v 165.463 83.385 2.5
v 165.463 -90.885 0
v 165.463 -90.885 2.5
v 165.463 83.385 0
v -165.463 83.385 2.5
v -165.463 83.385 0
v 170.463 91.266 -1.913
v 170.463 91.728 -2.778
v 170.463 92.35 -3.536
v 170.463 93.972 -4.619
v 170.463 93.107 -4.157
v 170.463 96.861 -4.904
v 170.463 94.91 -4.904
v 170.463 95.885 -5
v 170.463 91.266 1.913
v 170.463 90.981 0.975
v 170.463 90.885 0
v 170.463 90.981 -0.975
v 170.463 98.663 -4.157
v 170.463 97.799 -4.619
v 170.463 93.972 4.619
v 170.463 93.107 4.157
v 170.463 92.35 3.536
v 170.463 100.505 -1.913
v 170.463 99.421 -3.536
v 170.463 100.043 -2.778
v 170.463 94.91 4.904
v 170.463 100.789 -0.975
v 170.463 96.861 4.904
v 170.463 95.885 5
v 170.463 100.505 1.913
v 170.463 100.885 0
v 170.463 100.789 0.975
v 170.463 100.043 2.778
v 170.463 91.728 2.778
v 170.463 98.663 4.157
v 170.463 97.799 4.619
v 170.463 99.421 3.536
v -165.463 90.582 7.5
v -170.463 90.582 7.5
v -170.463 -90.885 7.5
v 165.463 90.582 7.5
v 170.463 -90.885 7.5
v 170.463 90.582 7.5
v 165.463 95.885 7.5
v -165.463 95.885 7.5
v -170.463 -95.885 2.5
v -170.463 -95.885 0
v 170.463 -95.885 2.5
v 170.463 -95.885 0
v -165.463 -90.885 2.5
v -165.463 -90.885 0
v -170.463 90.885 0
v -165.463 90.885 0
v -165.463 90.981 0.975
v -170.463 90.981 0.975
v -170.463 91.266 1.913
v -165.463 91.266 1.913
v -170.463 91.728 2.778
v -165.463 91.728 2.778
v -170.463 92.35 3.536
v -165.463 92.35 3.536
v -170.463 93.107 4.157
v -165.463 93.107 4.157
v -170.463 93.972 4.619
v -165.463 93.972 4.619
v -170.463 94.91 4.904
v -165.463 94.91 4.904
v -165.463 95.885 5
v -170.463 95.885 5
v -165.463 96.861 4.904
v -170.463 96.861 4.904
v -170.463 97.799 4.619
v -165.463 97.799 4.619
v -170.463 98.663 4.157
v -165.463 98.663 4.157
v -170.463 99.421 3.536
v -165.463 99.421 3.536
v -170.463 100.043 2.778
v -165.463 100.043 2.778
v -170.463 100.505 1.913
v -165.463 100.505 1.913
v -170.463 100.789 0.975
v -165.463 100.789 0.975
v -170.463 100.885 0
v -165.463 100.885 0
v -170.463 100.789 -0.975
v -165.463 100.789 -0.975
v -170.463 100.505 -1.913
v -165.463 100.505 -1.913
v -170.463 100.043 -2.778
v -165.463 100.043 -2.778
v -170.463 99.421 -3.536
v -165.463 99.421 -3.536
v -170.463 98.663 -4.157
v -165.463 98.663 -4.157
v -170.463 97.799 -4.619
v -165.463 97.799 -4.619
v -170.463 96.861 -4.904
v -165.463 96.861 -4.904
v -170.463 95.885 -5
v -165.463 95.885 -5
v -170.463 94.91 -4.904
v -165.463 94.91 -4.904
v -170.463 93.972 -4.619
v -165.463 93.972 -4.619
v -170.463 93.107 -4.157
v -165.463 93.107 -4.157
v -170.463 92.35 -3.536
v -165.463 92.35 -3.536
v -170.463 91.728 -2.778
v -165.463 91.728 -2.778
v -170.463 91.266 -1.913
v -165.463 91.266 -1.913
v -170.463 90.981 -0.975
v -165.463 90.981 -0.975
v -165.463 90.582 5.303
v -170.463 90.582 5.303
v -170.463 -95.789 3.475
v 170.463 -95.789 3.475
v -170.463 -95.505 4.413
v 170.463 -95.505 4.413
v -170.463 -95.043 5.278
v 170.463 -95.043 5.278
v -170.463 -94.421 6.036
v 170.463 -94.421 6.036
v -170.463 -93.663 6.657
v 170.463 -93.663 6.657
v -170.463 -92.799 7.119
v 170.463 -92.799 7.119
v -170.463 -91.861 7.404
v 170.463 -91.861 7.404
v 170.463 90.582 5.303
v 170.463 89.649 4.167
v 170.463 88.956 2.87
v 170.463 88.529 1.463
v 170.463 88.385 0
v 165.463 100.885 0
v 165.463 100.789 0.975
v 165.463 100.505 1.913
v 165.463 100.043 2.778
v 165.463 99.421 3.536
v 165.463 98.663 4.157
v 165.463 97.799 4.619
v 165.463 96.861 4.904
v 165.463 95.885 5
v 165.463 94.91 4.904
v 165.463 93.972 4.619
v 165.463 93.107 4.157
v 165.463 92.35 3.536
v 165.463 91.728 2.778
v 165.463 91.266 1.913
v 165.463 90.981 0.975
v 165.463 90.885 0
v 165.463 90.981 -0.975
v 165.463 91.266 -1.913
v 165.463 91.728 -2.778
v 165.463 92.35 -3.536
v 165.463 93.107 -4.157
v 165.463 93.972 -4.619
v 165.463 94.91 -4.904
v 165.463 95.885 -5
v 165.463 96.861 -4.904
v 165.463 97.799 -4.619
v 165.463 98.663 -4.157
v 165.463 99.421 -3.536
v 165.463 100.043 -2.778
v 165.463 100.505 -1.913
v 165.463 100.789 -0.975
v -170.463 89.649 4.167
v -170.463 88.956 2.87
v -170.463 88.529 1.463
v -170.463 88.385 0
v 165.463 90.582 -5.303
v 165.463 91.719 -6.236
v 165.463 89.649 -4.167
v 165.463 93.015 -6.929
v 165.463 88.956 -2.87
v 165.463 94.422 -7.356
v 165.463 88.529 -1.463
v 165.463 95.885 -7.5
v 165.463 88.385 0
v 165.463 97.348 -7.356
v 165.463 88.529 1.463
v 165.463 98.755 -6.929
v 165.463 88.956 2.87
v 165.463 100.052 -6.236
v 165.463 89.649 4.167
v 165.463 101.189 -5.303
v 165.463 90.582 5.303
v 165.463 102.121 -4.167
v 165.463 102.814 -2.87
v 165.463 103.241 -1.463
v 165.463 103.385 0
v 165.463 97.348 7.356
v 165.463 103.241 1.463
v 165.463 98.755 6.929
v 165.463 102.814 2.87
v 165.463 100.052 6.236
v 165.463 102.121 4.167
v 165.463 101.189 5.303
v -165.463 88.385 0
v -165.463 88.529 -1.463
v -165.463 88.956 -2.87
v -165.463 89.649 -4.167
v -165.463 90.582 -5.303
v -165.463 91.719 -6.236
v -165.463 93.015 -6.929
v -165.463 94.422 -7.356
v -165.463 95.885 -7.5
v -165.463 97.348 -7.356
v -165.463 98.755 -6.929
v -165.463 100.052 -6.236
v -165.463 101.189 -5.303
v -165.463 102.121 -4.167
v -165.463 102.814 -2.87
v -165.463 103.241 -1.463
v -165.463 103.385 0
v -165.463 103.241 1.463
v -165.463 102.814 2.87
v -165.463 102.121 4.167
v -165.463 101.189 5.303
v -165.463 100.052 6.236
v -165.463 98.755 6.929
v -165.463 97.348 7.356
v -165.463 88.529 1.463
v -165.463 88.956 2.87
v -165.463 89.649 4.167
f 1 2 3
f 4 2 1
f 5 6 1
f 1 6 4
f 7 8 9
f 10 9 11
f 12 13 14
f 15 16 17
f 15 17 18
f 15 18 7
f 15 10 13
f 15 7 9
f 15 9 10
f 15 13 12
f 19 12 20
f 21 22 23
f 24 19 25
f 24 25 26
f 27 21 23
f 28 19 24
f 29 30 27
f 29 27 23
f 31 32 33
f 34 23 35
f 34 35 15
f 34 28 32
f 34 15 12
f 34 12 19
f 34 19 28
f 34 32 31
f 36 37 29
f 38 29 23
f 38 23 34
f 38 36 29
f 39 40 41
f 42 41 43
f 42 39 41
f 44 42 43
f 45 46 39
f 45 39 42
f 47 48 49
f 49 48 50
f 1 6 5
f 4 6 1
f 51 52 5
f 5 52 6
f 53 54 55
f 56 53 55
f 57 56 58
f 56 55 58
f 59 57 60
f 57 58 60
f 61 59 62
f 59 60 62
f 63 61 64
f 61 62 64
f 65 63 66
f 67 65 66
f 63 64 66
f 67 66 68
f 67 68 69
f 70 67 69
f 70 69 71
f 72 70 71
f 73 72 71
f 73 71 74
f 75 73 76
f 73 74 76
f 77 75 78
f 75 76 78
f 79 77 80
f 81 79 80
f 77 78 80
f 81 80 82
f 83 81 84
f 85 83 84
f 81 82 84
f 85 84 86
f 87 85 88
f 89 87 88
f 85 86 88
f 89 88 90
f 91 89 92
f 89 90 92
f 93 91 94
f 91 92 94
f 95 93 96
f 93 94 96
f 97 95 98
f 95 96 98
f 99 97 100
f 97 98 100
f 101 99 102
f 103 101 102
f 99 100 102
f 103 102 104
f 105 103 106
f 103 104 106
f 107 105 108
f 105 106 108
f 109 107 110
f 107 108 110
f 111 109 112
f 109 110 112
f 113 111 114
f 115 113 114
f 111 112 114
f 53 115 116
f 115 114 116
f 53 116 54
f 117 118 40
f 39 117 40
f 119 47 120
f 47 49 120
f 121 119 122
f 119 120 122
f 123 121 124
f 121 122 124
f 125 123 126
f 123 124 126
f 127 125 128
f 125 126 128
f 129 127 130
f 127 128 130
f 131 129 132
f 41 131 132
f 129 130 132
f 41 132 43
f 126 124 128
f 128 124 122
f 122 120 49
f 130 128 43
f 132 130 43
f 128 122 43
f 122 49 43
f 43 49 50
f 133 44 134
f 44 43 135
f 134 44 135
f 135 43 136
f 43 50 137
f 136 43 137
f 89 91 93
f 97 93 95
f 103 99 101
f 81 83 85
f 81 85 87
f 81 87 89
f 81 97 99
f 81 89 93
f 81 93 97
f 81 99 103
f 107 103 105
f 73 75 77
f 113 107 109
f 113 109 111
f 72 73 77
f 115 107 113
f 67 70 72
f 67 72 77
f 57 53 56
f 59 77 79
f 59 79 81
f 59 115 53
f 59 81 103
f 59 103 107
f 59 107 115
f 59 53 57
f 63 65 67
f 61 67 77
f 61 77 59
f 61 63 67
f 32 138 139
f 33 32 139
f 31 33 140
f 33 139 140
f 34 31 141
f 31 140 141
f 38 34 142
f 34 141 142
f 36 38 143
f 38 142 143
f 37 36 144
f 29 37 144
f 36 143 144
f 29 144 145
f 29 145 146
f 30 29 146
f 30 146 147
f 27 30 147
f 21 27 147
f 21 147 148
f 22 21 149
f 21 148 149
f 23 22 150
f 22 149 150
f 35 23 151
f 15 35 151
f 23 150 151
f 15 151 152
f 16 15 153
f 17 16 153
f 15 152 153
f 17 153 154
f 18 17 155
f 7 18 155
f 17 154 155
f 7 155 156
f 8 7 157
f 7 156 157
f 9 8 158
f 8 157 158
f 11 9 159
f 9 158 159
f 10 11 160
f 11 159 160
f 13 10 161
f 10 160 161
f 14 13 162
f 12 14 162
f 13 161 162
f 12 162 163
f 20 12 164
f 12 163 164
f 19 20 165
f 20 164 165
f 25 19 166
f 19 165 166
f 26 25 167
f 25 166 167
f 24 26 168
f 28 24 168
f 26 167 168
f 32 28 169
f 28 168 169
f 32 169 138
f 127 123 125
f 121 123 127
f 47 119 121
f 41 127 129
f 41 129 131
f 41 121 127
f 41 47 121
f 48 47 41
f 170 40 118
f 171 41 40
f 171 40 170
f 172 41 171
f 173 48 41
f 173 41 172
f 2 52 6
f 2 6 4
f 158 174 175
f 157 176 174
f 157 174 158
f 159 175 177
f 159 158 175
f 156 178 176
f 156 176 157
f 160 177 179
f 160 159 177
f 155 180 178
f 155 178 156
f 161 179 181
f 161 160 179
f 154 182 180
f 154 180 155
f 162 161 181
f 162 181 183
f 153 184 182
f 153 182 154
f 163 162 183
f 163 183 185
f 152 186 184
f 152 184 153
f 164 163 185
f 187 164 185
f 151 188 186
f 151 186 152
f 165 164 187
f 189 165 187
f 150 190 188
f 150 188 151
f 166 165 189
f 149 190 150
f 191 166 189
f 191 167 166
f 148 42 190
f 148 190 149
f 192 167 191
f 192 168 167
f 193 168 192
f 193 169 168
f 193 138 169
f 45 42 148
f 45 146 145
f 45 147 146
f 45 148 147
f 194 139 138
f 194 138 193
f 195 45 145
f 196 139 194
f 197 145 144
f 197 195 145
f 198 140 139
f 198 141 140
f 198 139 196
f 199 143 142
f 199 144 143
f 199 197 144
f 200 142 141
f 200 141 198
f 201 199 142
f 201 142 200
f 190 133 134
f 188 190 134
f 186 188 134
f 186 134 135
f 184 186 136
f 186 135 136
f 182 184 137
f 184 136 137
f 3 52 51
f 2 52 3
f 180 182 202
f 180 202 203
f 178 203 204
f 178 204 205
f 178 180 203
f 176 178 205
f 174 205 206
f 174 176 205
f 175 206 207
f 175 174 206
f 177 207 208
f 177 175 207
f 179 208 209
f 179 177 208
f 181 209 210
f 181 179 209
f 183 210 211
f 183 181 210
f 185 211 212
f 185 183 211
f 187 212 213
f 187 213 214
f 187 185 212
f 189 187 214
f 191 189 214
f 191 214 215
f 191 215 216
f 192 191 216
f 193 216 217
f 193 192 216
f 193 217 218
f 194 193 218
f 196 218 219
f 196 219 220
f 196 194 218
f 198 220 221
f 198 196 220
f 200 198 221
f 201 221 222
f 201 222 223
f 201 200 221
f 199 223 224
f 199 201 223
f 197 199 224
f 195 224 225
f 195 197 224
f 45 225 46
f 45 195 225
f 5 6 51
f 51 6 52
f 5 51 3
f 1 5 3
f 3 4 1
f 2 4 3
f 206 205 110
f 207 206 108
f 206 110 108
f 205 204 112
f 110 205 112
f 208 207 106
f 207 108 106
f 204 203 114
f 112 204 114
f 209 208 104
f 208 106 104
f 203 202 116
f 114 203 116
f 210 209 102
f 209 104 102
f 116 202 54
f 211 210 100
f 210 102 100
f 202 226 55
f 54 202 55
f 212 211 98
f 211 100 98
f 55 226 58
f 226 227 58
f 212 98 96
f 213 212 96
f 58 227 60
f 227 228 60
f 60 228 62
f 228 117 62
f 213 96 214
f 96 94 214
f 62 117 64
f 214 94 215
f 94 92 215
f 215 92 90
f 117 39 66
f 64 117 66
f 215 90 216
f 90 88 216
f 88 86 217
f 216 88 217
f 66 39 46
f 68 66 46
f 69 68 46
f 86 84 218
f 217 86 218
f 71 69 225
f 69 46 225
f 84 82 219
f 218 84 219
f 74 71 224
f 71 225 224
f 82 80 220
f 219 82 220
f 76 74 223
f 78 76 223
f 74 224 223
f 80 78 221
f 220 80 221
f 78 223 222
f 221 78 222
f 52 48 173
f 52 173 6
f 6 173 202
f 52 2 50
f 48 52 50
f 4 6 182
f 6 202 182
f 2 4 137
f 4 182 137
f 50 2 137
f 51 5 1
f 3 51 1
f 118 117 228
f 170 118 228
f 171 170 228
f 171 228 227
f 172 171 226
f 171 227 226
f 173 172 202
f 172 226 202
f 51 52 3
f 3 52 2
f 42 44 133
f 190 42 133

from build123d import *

# Parameters (mm, degrees)
F0_W      = 340.9254871016
F0_H      = 191.7705864947
F1_DEPTH  = 7.5
F2_T      = -5
F4_DEPTH  = 2.5
F5_DEPTH  = 340.9254871016
F6_DEPTH  = 2.5
F7_START  = -5
F7_DEPTH  = 330.9254871016
F8_DEPTH  = 5
F9_START  = -335.9254871016
F9_DEPTH  = 5
F10_DEPTH = 2.5
F12_R     = 5
F13_DEPTH = 5
F11_R     = 5
F14_DEPTH = 5
F15_R     = 5
F17_DEPTH = 5
F19_DEPTH = 5
F20_W     = 330.9254871016
F20_H     = 174.2705864947
F21_DEPTH = 2.5


with BuildPart() as f1:
    # F0 (on Top) → F1 (new body)
    with BuildSketch(Plane.XY):
        Rectangle(F0_W, F0_H)
    extrude(amount=F1_DEPTH)

    # F2
    f2_openings = [f1.faces().sort_by_distance(p)[0] for p in [
        (0, 0, 0),
    ]]
    offset(amount=F2_T, openings=f2_openings)

    # F4 (add): a face of the model
    f4_faces = [f1.faces().sort_by_distance(p)[0] for p in [
        (0, 90.8852932473, 1.25),
    ]]
    extrude(f4_faces, amount=F4_DEPTH)

    # F3 (on face) → F5 (cut, through all)
    with BuildSketch(Plane.YZ.offset(170.4627435508)):
        with BuildLine():
            Line((95.8852932473, 0), (95.8852932473, 5))
            ThreePointArc((95.8852932473, 5), (92.3497593414, 3.5355339059), (90.8852932473, 0))
            Line((90.8852932473, 0), (95.8852932473, 0))
        make_face()
    extrude(amount=-F5_DEPTH, mode=Mode.SUBTRACT)

    # F6 (add): a face of the model
    f6_faces = [f1.faces().sort_by_distance(p)[0] for p in [
        (0, 88.3852932473, 1.25),
    ]]
    extrude(f6_faces, amount=F6_DEPTH)

    # F3 (on face) → F7 (join)
    with BuildSketch(Plane.YZ.offset(170.4627435508).offset(F7_START)):
        with BuildLine():
            ThreePointArc((88.3852932473, 0), (95.8852932473, -7.5), (103.3852932473, 0))
            ThreePointArc((103.3852932473, 0), (101.1885941062, 5.3033008589), (95.8852932473, 7.5))
            Line((95.8852932473, 7.5), (95.8852932473, 5))
            ThreePointArc((95.8852932473, 5), (99.4208271533, 3.5355339059), (100.8852932473, 0))
            ThreePointArc((100.8852932473, 0), (95.8852932473, -5), (90.8852932473, 0))
            Line((90.8852932473, 0), (88.3852932473, 0))
        make_face()
        with BuildLine():
            ThreePointArc((100.8852932473, 0), (99.4208271533, 3.5355339059), (95.8852932473, 5))
            Line((95.8852932473, 5), (95.8852932473, 0))
            Line((95.8852932473, 0), (90.8852932473, 0))
            ThreePointArc((90.8852932473, 0), (95.8852932473, -5), (100.8852932473, 0))
        make_face()
        with BuildLine():
            Line((95.8852932473, 0), (95.8852932473, 5))
            ThreePointArc((95.8852932473, 5), (92.3497593414, 3.5355339059), (90.8852932473, 0))
            Line((90.8852932473, 0), (95.8852932473, 0))
        make_face()
    extrude(amount=-F7_DEPTH)

    # F3 (on face) → F8 (cut)
    with BuildSketch(Plane.YZ.offset(170.4627435508)):
        with BuildLine():
            Line((95.8852932473, 5), (95.8852932473, 7.5))
            ThreePointArc((95.8852932473, 7.5), (90.5819923884, 5.3033008589), (88.3852932473, 0))
            Line((88.3852932473, 0), (90.8852932473, 0))
            ThreePointArc((90.8852932473, 0), (92.3497593414, 3.5355339059), (95.8852932473, 5))
        make_face()
    extrude(amount=-F8_DEPTH, mode=Mode.SUBTRACT)

    # F3 (on face) → F9 (cut)
    with BuildSketch(Plane.YZ.offset(170.4627435508).offset(F9_START)):
        with BuildLine():
            Line((95.8852932473, 5), (95.8852932473, 7.5))
            ThreePointArc((95.8852932473, 7.5), (90.5819923884, 5.3033008589), (88.3852932473, 0))
            Line((88.3852932473, 0), (90.8852932473, 0))
            ThreePointArc((90.8852932473, 0), (92.3497593414, 3.5355339059), (95.8852932473, 5))
        make_face()
    extrude(amount=-F9_DEPTH, mode=Mode.SUBTRACT)

    # F10 (add): a face of the model
    f10_faces = [f1.faces().sort_by_distance(p)[0] for p in [
        (0, 85.8852932473, 1.25),
    ]]
    extrude(f10_faces, amount=F10_DEPTH)

    # F12 (on face) → F13 (join)
    with BuildSketch(Plane.YZ.offset(165.4627435508)):
        with Locations((95.8852932473, 0)):
            Circle(F12_R)
    extrude(amount=F13_DEPTH)

    # F11 (on face) → F14 (join)
    with BuildSketch(Plane(origin=(-165.4627435508, 0, 0), x_dir=(0, -1, 0), z_dir=(-1, 0, 0))):
        with Locations((-95.8852932473, 0)):
            Circle(F11_R)
    extrude(amount=F14_DEPTH)

    # F15
    f15_edges = [f1.edges().sort_by_distance(p)[0] for p in [
        (0, -95.885293, 7.5),
    ]]
    fillet(f15_edges, radius=F15_R)

    # F16 (on face) → F17 (cut)
    with BuildSketch(Plane.YZ.offset(170.4627435508)):
        Polygon((90.5819923884, 7.5), (90.5819923884, 5.3033008589), (95.8852932473, 7.5), align=None)
    extrude(amount=-F17_DEPTH, mode=Mode.SUBTRACT)

    # F18 (on face) → F19 (cut)
    with BuildSketch(Plane(origin=(-170.4627435508, 0, 0), x_dir=(0, -1, 0), z_dir=(-1, 0, 0))):
        Polygon((-95.8852932473, 7.5), (-90.5819923884, 5.3033008589), (-90.5819923884, 7.5), align=None)
    extrude(amount=-F19_DEPTH, mode=Mode.SUBTRACT)


with BuildPart() as f21:
    # F20 (on face) → F21 (new body, through all)
    with BuildSketch(Plane(origin=(0, 0, 0), x_dir=(1, 0, 0), z_dir=(0, 0, -1))):
        with Locations((0, 3.75)):
            Rectangle(F20_W, F20_H)
    extrude(amount=-F21_DEPTH)


solid = Compound([f1.part, f21.part])
